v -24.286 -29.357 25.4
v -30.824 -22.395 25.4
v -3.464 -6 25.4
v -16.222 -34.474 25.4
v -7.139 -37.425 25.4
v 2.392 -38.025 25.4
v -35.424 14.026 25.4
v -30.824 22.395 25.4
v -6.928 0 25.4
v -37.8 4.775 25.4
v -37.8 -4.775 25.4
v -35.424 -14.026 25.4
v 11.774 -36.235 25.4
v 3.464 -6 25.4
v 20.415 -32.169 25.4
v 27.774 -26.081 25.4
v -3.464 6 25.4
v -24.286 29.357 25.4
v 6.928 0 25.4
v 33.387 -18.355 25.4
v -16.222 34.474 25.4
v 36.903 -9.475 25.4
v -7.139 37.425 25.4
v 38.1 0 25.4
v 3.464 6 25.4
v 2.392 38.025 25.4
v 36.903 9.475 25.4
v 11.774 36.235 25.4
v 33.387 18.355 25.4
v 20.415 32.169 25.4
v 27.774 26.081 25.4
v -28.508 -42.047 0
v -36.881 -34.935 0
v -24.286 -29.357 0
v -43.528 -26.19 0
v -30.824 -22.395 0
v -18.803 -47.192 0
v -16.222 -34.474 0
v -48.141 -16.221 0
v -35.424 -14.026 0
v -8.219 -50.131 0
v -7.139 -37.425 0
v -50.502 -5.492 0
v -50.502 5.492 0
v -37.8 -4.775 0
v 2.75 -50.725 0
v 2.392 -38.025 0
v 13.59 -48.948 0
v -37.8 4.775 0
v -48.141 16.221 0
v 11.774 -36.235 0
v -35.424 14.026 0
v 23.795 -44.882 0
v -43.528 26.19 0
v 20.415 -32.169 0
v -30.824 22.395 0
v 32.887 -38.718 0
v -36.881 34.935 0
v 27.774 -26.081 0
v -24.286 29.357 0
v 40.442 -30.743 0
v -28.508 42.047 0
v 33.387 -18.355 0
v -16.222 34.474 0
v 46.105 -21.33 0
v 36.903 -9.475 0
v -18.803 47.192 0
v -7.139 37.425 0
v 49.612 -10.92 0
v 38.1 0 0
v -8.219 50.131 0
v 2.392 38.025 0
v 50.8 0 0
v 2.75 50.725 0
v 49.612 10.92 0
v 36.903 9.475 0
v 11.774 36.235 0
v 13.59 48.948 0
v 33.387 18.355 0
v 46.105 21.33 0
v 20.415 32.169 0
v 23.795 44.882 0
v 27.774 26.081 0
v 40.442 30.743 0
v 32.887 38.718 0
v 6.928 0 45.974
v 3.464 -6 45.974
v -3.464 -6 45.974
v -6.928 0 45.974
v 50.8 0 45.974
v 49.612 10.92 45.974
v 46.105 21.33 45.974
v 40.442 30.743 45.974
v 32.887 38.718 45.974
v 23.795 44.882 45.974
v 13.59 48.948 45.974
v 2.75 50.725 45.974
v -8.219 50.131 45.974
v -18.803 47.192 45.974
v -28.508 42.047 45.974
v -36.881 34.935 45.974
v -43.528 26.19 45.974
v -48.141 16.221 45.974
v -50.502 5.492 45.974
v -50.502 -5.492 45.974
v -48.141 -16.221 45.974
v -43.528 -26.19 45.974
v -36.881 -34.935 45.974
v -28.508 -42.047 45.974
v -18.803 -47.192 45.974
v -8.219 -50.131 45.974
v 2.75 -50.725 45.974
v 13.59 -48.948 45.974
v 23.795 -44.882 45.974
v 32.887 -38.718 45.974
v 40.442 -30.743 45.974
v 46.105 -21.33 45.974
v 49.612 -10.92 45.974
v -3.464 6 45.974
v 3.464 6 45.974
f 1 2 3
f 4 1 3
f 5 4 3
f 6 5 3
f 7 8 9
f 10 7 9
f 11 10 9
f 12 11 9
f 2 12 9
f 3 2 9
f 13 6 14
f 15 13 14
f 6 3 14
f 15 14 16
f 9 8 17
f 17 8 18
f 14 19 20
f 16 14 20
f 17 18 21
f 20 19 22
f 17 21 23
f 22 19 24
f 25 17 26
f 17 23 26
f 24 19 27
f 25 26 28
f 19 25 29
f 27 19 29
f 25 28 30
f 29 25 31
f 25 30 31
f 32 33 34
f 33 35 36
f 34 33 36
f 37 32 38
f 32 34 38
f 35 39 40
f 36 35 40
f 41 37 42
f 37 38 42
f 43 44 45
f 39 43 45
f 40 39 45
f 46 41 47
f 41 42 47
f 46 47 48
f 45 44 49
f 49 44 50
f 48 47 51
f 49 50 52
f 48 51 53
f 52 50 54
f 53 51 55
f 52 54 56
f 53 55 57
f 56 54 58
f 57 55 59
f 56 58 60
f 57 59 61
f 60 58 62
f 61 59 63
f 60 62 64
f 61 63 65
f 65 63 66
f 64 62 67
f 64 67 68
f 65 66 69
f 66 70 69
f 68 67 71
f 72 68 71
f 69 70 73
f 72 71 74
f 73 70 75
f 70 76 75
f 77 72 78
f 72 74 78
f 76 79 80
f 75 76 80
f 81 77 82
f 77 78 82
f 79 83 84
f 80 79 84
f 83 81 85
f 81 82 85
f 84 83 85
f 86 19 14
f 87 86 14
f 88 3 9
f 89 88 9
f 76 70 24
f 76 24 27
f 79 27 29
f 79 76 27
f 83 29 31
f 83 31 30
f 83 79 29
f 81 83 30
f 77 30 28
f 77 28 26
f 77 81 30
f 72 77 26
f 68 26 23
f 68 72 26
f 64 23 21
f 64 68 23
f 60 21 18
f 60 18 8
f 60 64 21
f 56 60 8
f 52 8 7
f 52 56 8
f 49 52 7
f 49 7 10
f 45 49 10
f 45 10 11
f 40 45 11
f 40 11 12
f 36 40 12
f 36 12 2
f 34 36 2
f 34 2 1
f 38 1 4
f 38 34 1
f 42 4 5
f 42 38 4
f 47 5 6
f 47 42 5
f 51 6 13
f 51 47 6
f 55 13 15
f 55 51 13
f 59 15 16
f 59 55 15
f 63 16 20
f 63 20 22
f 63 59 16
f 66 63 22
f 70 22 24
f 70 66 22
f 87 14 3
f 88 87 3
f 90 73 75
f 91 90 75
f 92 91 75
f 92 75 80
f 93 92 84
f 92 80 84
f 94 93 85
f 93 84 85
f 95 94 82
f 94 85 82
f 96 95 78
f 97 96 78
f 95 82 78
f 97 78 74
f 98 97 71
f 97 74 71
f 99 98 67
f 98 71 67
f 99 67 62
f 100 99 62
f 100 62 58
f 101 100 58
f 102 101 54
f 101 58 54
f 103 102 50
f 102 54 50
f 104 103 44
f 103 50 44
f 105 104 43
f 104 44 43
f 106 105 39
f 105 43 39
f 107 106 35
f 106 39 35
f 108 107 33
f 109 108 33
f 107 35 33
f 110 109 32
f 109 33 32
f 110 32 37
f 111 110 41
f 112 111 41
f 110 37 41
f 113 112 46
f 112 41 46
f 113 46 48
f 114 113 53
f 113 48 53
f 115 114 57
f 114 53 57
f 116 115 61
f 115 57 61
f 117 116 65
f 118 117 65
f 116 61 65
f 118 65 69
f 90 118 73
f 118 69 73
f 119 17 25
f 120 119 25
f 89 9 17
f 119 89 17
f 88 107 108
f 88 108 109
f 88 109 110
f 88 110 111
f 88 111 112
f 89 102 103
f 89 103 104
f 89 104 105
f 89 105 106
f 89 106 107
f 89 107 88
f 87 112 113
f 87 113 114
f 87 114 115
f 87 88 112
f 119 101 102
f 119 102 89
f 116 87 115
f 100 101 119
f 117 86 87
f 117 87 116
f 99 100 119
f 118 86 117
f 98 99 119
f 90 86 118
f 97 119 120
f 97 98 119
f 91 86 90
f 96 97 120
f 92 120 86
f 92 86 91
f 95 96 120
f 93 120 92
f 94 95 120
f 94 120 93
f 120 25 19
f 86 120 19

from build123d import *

# Parameters (mm, degrees)
SKETCH1_R           = 50.8
SKETCH1_R_2         = 6.92820323
BOSS_EXTRUDE1_DEPTH = 45.974
SKETCH2_R           = 38.1
CUT_EXTRUDE1_DEPTH  = 25.4


with BuildPart() as part:
    # Sketch1 → Boss-Extrude1 (new body)
    # profile 1 of 7: a face of its own
    with BuildSketch(Plane.XY):
        Circle(SKETCH1_R)
        Circle(SKETCH1_R_2, mode=Mode.SUBTRACT)
    # profile 2 of 7: a face of its own
    with BuildSketch(Plane.XY):
        with BuildLine():
            Line((-3.464101615, -6), (-6.92820323, 0))
            ThreePointArc((-6.92820323, 0), (-6, -3.464101615), (-3.464101615, -6))
        make_face()
    # profile 3 of 7: a face of its own
    with BuildSketch(Plane.XY):
        with BuildLine():
            Line((-6.92820323, 0), (-3.464101615, 6))
            ThreePointArc((-3.464101615, 6), (-6, 3.464101615), (-6.92820323, 0))
        make_face()
    # profile 4 of 7: a face of its own
    with BuildSketch(Plane.XY):
        with BuildLine():
            ThreePointArc((3.464101615, 6), (0, 6.92820323), (-3.464101615, 6))
            Line((-3.464101615, 6), (3.464101615, 6))
        make_face()
    # profile 5 of 7: a face of its own
    with BuildSketch(Plane.XY):
        with BuildLine():
            ThreePointArc((6.92820323, 0), (6, 3.464101615), (3.464101615, 6))
            Line((3.464101615, 6), (6.92820323, 0))
        make_face()
    # profile 6 of 7: a face of its own
    with BuildSketch(Plane.XY):
        with BuildLine():
            ThreePointArc((3.464101615, -6), (6, -3.464101615), (6.92820323, 0))
            Line((6.92820323, 0), (3.464101615, -6))
        make_face()
    # profile 7 of 7: a face of its own
    with BuildSketch(Plane.XY):
        with BuildLine():
            Line((3.464101615, -6), (-3.464101615, -6))
            ThreePointArc((-3.464101615, -6), (0, -6.92820323), (3.464101615, -6))
        make_face()
    extrude(amount=BOSS_EXTRUDE1_DEPTH)

    # Sketch2 → Cut-Extrude1 (cut)
    with BuildSketch(Plane.XY):
        Circle(SKETCH2_R)
    extrude(amount=CUT_EXTRUDE1_DEPTH, mode=Mode.SUBTRACT)


solid = part.part
